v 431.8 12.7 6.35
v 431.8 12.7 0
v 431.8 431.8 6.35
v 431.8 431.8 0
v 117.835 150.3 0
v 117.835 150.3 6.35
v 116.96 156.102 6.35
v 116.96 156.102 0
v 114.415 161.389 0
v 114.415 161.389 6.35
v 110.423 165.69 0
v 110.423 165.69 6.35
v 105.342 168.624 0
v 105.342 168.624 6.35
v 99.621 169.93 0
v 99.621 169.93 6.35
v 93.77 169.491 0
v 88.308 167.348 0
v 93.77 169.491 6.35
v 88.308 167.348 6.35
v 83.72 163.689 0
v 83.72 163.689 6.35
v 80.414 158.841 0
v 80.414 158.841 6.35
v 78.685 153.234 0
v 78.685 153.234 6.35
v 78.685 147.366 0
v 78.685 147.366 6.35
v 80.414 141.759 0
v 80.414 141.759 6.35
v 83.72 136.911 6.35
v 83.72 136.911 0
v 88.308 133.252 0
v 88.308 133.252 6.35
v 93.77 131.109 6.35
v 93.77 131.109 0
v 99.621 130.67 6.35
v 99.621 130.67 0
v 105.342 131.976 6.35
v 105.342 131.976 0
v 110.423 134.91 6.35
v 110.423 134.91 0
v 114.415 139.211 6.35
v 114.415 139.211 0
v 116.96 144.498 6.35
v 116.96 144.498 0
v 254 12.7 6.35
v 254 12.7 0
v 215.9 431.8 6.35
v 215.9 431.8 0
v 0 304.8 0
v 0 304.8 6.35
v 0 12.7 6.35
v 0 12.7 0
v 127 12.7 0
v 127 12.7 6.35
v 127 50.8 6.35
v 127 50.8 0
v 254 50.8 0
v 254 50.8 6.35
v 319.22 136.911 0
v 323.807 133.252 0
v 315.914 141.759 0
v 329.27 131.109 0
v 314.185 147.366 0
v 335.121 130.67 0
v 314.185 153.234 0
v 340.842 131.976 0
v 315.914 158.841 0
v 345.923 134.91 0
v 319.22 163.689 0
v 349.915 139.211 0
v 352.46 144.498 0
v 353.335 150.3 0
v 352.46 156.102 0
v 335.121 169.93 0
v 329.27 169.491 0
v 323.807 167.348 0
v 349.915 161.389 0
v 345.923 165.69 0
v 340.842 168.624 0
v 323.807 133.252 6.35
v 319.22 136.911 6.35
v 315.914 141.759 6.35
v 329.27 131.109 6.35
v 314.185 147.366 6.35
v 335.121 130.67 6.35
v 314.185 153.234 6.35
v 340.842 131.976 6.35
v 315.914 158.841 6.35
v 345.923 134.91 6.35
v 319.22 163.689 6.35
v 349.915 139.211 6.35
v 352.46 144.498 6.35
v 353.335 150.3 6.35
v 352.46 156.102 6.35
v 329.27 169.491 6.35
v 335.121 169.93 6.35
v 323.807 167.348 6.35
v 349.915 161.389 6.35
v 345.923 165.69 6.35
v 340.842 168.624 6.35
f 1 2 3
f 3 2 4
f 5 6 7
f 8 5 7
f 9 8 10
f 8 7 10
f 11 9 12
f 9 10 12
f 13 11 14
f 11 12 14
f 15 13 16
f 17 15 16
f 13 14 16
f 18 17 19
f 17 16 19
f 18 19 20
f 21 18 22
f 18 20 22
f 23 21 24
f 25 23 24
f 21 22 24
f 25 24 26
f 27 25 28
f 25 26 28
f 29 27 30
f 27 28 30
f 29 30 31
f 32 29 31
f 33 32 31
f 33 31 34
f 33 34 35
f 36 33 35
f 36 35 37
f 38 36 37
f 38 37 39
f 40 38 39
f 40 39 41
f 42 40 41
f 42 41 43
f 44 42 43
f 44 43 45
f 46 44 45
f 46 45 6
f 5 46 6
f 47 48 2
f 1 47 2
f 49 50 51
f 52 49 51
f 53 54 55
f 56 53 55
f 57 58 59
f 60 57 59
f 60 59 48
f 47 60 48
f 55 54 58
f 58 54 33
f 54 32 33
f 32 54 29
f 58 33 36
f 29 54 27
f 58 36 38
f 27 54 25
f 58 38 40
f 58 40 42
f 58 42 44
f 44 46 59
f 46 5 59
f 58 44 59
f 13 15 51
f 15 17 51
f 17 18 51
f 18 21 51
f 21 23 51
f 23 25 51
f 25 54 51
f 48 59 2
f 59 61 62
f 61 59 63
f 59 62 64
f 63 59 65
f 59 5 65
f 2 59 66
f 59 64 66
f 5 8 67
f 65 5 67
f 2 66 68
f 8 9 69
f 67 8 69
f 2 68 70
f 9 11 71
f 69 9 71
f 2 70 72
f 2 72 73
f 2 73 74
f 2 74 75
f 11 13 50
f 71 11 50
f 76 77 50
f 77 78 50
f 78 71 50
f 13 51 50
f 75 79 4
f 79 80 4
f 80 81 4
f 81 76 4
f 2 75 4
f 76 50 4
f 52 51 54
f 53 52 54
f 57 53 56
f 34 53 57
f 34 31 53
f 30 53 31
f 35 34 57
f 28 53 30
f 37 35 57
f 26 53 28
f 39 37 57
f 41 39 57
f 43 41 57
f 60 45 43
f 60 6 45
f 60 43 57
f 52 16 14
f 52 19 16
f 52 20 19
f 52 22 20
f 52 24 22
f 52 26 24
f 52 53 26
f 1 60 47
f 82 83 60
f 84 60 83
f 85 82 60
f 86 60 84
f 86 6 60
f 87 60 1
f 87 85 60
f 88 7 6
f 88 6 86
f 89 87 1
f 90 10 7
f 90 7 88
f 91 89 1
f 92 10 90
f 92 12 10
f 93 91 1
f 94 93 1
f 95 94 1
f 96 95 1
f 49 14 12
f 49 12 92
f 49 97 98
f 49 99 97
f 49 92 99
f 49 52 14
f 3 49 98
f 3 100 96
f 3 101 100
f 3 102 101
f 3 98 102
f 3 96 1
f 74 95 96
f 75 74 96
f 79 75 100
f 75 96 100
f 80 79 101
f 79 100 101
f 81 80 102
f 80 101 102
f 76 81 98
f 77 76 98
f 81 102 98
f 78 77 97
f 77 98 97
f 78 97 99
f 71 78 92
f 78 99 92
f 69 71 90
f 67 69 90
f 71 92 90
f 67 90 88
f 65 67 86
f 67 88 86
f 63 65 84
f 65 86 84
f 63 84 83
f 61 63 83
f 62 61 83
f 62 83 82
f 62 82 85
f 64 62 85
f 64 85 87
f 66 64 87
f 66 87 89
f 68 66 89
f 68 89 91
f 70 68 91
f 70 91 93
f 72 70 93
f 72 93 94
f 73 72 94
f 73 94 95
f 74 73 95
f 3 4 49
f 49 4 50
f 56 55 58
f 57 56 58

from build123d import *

# Parameters (mm, degrees)
BOSS_EXTRUDE1_DEPTH = 6.35
SKETCH3_R           = 19.685
CUT_EXTRUDE1_DEPTH  = 7.35


with BuildPart() as part:
    # Sketch2 → Boss-Extrude1 (new body)
    with BuildSketch(Plane.XY):
        Polygon((0, 304.8), (0, 12.7), (127, 12.7), (127, 50.8), (254, 50.8), (254, 12.7), (431.8, 12.7), (431.8, 431.8), (215.9, 431.8), align=None)
    extrude(amount=BOSS_EXTRUDE1_DEPTH)

    # Sketch3 → Cut-Extrude1 (cut, through all)
    with BuildSketch(Plane.XY.offset(6.35)):
        with Locations((98.15, 150.3)):
            Circle(SKETCH3_R)
        with Locations((333.65, 150.3)):
            Circle(SKETCH3_R)
    extrude(amount=-CUT_EXTRUDE1_DEPTH, mode=Mode.SUBTRACT)


solid = part.part
